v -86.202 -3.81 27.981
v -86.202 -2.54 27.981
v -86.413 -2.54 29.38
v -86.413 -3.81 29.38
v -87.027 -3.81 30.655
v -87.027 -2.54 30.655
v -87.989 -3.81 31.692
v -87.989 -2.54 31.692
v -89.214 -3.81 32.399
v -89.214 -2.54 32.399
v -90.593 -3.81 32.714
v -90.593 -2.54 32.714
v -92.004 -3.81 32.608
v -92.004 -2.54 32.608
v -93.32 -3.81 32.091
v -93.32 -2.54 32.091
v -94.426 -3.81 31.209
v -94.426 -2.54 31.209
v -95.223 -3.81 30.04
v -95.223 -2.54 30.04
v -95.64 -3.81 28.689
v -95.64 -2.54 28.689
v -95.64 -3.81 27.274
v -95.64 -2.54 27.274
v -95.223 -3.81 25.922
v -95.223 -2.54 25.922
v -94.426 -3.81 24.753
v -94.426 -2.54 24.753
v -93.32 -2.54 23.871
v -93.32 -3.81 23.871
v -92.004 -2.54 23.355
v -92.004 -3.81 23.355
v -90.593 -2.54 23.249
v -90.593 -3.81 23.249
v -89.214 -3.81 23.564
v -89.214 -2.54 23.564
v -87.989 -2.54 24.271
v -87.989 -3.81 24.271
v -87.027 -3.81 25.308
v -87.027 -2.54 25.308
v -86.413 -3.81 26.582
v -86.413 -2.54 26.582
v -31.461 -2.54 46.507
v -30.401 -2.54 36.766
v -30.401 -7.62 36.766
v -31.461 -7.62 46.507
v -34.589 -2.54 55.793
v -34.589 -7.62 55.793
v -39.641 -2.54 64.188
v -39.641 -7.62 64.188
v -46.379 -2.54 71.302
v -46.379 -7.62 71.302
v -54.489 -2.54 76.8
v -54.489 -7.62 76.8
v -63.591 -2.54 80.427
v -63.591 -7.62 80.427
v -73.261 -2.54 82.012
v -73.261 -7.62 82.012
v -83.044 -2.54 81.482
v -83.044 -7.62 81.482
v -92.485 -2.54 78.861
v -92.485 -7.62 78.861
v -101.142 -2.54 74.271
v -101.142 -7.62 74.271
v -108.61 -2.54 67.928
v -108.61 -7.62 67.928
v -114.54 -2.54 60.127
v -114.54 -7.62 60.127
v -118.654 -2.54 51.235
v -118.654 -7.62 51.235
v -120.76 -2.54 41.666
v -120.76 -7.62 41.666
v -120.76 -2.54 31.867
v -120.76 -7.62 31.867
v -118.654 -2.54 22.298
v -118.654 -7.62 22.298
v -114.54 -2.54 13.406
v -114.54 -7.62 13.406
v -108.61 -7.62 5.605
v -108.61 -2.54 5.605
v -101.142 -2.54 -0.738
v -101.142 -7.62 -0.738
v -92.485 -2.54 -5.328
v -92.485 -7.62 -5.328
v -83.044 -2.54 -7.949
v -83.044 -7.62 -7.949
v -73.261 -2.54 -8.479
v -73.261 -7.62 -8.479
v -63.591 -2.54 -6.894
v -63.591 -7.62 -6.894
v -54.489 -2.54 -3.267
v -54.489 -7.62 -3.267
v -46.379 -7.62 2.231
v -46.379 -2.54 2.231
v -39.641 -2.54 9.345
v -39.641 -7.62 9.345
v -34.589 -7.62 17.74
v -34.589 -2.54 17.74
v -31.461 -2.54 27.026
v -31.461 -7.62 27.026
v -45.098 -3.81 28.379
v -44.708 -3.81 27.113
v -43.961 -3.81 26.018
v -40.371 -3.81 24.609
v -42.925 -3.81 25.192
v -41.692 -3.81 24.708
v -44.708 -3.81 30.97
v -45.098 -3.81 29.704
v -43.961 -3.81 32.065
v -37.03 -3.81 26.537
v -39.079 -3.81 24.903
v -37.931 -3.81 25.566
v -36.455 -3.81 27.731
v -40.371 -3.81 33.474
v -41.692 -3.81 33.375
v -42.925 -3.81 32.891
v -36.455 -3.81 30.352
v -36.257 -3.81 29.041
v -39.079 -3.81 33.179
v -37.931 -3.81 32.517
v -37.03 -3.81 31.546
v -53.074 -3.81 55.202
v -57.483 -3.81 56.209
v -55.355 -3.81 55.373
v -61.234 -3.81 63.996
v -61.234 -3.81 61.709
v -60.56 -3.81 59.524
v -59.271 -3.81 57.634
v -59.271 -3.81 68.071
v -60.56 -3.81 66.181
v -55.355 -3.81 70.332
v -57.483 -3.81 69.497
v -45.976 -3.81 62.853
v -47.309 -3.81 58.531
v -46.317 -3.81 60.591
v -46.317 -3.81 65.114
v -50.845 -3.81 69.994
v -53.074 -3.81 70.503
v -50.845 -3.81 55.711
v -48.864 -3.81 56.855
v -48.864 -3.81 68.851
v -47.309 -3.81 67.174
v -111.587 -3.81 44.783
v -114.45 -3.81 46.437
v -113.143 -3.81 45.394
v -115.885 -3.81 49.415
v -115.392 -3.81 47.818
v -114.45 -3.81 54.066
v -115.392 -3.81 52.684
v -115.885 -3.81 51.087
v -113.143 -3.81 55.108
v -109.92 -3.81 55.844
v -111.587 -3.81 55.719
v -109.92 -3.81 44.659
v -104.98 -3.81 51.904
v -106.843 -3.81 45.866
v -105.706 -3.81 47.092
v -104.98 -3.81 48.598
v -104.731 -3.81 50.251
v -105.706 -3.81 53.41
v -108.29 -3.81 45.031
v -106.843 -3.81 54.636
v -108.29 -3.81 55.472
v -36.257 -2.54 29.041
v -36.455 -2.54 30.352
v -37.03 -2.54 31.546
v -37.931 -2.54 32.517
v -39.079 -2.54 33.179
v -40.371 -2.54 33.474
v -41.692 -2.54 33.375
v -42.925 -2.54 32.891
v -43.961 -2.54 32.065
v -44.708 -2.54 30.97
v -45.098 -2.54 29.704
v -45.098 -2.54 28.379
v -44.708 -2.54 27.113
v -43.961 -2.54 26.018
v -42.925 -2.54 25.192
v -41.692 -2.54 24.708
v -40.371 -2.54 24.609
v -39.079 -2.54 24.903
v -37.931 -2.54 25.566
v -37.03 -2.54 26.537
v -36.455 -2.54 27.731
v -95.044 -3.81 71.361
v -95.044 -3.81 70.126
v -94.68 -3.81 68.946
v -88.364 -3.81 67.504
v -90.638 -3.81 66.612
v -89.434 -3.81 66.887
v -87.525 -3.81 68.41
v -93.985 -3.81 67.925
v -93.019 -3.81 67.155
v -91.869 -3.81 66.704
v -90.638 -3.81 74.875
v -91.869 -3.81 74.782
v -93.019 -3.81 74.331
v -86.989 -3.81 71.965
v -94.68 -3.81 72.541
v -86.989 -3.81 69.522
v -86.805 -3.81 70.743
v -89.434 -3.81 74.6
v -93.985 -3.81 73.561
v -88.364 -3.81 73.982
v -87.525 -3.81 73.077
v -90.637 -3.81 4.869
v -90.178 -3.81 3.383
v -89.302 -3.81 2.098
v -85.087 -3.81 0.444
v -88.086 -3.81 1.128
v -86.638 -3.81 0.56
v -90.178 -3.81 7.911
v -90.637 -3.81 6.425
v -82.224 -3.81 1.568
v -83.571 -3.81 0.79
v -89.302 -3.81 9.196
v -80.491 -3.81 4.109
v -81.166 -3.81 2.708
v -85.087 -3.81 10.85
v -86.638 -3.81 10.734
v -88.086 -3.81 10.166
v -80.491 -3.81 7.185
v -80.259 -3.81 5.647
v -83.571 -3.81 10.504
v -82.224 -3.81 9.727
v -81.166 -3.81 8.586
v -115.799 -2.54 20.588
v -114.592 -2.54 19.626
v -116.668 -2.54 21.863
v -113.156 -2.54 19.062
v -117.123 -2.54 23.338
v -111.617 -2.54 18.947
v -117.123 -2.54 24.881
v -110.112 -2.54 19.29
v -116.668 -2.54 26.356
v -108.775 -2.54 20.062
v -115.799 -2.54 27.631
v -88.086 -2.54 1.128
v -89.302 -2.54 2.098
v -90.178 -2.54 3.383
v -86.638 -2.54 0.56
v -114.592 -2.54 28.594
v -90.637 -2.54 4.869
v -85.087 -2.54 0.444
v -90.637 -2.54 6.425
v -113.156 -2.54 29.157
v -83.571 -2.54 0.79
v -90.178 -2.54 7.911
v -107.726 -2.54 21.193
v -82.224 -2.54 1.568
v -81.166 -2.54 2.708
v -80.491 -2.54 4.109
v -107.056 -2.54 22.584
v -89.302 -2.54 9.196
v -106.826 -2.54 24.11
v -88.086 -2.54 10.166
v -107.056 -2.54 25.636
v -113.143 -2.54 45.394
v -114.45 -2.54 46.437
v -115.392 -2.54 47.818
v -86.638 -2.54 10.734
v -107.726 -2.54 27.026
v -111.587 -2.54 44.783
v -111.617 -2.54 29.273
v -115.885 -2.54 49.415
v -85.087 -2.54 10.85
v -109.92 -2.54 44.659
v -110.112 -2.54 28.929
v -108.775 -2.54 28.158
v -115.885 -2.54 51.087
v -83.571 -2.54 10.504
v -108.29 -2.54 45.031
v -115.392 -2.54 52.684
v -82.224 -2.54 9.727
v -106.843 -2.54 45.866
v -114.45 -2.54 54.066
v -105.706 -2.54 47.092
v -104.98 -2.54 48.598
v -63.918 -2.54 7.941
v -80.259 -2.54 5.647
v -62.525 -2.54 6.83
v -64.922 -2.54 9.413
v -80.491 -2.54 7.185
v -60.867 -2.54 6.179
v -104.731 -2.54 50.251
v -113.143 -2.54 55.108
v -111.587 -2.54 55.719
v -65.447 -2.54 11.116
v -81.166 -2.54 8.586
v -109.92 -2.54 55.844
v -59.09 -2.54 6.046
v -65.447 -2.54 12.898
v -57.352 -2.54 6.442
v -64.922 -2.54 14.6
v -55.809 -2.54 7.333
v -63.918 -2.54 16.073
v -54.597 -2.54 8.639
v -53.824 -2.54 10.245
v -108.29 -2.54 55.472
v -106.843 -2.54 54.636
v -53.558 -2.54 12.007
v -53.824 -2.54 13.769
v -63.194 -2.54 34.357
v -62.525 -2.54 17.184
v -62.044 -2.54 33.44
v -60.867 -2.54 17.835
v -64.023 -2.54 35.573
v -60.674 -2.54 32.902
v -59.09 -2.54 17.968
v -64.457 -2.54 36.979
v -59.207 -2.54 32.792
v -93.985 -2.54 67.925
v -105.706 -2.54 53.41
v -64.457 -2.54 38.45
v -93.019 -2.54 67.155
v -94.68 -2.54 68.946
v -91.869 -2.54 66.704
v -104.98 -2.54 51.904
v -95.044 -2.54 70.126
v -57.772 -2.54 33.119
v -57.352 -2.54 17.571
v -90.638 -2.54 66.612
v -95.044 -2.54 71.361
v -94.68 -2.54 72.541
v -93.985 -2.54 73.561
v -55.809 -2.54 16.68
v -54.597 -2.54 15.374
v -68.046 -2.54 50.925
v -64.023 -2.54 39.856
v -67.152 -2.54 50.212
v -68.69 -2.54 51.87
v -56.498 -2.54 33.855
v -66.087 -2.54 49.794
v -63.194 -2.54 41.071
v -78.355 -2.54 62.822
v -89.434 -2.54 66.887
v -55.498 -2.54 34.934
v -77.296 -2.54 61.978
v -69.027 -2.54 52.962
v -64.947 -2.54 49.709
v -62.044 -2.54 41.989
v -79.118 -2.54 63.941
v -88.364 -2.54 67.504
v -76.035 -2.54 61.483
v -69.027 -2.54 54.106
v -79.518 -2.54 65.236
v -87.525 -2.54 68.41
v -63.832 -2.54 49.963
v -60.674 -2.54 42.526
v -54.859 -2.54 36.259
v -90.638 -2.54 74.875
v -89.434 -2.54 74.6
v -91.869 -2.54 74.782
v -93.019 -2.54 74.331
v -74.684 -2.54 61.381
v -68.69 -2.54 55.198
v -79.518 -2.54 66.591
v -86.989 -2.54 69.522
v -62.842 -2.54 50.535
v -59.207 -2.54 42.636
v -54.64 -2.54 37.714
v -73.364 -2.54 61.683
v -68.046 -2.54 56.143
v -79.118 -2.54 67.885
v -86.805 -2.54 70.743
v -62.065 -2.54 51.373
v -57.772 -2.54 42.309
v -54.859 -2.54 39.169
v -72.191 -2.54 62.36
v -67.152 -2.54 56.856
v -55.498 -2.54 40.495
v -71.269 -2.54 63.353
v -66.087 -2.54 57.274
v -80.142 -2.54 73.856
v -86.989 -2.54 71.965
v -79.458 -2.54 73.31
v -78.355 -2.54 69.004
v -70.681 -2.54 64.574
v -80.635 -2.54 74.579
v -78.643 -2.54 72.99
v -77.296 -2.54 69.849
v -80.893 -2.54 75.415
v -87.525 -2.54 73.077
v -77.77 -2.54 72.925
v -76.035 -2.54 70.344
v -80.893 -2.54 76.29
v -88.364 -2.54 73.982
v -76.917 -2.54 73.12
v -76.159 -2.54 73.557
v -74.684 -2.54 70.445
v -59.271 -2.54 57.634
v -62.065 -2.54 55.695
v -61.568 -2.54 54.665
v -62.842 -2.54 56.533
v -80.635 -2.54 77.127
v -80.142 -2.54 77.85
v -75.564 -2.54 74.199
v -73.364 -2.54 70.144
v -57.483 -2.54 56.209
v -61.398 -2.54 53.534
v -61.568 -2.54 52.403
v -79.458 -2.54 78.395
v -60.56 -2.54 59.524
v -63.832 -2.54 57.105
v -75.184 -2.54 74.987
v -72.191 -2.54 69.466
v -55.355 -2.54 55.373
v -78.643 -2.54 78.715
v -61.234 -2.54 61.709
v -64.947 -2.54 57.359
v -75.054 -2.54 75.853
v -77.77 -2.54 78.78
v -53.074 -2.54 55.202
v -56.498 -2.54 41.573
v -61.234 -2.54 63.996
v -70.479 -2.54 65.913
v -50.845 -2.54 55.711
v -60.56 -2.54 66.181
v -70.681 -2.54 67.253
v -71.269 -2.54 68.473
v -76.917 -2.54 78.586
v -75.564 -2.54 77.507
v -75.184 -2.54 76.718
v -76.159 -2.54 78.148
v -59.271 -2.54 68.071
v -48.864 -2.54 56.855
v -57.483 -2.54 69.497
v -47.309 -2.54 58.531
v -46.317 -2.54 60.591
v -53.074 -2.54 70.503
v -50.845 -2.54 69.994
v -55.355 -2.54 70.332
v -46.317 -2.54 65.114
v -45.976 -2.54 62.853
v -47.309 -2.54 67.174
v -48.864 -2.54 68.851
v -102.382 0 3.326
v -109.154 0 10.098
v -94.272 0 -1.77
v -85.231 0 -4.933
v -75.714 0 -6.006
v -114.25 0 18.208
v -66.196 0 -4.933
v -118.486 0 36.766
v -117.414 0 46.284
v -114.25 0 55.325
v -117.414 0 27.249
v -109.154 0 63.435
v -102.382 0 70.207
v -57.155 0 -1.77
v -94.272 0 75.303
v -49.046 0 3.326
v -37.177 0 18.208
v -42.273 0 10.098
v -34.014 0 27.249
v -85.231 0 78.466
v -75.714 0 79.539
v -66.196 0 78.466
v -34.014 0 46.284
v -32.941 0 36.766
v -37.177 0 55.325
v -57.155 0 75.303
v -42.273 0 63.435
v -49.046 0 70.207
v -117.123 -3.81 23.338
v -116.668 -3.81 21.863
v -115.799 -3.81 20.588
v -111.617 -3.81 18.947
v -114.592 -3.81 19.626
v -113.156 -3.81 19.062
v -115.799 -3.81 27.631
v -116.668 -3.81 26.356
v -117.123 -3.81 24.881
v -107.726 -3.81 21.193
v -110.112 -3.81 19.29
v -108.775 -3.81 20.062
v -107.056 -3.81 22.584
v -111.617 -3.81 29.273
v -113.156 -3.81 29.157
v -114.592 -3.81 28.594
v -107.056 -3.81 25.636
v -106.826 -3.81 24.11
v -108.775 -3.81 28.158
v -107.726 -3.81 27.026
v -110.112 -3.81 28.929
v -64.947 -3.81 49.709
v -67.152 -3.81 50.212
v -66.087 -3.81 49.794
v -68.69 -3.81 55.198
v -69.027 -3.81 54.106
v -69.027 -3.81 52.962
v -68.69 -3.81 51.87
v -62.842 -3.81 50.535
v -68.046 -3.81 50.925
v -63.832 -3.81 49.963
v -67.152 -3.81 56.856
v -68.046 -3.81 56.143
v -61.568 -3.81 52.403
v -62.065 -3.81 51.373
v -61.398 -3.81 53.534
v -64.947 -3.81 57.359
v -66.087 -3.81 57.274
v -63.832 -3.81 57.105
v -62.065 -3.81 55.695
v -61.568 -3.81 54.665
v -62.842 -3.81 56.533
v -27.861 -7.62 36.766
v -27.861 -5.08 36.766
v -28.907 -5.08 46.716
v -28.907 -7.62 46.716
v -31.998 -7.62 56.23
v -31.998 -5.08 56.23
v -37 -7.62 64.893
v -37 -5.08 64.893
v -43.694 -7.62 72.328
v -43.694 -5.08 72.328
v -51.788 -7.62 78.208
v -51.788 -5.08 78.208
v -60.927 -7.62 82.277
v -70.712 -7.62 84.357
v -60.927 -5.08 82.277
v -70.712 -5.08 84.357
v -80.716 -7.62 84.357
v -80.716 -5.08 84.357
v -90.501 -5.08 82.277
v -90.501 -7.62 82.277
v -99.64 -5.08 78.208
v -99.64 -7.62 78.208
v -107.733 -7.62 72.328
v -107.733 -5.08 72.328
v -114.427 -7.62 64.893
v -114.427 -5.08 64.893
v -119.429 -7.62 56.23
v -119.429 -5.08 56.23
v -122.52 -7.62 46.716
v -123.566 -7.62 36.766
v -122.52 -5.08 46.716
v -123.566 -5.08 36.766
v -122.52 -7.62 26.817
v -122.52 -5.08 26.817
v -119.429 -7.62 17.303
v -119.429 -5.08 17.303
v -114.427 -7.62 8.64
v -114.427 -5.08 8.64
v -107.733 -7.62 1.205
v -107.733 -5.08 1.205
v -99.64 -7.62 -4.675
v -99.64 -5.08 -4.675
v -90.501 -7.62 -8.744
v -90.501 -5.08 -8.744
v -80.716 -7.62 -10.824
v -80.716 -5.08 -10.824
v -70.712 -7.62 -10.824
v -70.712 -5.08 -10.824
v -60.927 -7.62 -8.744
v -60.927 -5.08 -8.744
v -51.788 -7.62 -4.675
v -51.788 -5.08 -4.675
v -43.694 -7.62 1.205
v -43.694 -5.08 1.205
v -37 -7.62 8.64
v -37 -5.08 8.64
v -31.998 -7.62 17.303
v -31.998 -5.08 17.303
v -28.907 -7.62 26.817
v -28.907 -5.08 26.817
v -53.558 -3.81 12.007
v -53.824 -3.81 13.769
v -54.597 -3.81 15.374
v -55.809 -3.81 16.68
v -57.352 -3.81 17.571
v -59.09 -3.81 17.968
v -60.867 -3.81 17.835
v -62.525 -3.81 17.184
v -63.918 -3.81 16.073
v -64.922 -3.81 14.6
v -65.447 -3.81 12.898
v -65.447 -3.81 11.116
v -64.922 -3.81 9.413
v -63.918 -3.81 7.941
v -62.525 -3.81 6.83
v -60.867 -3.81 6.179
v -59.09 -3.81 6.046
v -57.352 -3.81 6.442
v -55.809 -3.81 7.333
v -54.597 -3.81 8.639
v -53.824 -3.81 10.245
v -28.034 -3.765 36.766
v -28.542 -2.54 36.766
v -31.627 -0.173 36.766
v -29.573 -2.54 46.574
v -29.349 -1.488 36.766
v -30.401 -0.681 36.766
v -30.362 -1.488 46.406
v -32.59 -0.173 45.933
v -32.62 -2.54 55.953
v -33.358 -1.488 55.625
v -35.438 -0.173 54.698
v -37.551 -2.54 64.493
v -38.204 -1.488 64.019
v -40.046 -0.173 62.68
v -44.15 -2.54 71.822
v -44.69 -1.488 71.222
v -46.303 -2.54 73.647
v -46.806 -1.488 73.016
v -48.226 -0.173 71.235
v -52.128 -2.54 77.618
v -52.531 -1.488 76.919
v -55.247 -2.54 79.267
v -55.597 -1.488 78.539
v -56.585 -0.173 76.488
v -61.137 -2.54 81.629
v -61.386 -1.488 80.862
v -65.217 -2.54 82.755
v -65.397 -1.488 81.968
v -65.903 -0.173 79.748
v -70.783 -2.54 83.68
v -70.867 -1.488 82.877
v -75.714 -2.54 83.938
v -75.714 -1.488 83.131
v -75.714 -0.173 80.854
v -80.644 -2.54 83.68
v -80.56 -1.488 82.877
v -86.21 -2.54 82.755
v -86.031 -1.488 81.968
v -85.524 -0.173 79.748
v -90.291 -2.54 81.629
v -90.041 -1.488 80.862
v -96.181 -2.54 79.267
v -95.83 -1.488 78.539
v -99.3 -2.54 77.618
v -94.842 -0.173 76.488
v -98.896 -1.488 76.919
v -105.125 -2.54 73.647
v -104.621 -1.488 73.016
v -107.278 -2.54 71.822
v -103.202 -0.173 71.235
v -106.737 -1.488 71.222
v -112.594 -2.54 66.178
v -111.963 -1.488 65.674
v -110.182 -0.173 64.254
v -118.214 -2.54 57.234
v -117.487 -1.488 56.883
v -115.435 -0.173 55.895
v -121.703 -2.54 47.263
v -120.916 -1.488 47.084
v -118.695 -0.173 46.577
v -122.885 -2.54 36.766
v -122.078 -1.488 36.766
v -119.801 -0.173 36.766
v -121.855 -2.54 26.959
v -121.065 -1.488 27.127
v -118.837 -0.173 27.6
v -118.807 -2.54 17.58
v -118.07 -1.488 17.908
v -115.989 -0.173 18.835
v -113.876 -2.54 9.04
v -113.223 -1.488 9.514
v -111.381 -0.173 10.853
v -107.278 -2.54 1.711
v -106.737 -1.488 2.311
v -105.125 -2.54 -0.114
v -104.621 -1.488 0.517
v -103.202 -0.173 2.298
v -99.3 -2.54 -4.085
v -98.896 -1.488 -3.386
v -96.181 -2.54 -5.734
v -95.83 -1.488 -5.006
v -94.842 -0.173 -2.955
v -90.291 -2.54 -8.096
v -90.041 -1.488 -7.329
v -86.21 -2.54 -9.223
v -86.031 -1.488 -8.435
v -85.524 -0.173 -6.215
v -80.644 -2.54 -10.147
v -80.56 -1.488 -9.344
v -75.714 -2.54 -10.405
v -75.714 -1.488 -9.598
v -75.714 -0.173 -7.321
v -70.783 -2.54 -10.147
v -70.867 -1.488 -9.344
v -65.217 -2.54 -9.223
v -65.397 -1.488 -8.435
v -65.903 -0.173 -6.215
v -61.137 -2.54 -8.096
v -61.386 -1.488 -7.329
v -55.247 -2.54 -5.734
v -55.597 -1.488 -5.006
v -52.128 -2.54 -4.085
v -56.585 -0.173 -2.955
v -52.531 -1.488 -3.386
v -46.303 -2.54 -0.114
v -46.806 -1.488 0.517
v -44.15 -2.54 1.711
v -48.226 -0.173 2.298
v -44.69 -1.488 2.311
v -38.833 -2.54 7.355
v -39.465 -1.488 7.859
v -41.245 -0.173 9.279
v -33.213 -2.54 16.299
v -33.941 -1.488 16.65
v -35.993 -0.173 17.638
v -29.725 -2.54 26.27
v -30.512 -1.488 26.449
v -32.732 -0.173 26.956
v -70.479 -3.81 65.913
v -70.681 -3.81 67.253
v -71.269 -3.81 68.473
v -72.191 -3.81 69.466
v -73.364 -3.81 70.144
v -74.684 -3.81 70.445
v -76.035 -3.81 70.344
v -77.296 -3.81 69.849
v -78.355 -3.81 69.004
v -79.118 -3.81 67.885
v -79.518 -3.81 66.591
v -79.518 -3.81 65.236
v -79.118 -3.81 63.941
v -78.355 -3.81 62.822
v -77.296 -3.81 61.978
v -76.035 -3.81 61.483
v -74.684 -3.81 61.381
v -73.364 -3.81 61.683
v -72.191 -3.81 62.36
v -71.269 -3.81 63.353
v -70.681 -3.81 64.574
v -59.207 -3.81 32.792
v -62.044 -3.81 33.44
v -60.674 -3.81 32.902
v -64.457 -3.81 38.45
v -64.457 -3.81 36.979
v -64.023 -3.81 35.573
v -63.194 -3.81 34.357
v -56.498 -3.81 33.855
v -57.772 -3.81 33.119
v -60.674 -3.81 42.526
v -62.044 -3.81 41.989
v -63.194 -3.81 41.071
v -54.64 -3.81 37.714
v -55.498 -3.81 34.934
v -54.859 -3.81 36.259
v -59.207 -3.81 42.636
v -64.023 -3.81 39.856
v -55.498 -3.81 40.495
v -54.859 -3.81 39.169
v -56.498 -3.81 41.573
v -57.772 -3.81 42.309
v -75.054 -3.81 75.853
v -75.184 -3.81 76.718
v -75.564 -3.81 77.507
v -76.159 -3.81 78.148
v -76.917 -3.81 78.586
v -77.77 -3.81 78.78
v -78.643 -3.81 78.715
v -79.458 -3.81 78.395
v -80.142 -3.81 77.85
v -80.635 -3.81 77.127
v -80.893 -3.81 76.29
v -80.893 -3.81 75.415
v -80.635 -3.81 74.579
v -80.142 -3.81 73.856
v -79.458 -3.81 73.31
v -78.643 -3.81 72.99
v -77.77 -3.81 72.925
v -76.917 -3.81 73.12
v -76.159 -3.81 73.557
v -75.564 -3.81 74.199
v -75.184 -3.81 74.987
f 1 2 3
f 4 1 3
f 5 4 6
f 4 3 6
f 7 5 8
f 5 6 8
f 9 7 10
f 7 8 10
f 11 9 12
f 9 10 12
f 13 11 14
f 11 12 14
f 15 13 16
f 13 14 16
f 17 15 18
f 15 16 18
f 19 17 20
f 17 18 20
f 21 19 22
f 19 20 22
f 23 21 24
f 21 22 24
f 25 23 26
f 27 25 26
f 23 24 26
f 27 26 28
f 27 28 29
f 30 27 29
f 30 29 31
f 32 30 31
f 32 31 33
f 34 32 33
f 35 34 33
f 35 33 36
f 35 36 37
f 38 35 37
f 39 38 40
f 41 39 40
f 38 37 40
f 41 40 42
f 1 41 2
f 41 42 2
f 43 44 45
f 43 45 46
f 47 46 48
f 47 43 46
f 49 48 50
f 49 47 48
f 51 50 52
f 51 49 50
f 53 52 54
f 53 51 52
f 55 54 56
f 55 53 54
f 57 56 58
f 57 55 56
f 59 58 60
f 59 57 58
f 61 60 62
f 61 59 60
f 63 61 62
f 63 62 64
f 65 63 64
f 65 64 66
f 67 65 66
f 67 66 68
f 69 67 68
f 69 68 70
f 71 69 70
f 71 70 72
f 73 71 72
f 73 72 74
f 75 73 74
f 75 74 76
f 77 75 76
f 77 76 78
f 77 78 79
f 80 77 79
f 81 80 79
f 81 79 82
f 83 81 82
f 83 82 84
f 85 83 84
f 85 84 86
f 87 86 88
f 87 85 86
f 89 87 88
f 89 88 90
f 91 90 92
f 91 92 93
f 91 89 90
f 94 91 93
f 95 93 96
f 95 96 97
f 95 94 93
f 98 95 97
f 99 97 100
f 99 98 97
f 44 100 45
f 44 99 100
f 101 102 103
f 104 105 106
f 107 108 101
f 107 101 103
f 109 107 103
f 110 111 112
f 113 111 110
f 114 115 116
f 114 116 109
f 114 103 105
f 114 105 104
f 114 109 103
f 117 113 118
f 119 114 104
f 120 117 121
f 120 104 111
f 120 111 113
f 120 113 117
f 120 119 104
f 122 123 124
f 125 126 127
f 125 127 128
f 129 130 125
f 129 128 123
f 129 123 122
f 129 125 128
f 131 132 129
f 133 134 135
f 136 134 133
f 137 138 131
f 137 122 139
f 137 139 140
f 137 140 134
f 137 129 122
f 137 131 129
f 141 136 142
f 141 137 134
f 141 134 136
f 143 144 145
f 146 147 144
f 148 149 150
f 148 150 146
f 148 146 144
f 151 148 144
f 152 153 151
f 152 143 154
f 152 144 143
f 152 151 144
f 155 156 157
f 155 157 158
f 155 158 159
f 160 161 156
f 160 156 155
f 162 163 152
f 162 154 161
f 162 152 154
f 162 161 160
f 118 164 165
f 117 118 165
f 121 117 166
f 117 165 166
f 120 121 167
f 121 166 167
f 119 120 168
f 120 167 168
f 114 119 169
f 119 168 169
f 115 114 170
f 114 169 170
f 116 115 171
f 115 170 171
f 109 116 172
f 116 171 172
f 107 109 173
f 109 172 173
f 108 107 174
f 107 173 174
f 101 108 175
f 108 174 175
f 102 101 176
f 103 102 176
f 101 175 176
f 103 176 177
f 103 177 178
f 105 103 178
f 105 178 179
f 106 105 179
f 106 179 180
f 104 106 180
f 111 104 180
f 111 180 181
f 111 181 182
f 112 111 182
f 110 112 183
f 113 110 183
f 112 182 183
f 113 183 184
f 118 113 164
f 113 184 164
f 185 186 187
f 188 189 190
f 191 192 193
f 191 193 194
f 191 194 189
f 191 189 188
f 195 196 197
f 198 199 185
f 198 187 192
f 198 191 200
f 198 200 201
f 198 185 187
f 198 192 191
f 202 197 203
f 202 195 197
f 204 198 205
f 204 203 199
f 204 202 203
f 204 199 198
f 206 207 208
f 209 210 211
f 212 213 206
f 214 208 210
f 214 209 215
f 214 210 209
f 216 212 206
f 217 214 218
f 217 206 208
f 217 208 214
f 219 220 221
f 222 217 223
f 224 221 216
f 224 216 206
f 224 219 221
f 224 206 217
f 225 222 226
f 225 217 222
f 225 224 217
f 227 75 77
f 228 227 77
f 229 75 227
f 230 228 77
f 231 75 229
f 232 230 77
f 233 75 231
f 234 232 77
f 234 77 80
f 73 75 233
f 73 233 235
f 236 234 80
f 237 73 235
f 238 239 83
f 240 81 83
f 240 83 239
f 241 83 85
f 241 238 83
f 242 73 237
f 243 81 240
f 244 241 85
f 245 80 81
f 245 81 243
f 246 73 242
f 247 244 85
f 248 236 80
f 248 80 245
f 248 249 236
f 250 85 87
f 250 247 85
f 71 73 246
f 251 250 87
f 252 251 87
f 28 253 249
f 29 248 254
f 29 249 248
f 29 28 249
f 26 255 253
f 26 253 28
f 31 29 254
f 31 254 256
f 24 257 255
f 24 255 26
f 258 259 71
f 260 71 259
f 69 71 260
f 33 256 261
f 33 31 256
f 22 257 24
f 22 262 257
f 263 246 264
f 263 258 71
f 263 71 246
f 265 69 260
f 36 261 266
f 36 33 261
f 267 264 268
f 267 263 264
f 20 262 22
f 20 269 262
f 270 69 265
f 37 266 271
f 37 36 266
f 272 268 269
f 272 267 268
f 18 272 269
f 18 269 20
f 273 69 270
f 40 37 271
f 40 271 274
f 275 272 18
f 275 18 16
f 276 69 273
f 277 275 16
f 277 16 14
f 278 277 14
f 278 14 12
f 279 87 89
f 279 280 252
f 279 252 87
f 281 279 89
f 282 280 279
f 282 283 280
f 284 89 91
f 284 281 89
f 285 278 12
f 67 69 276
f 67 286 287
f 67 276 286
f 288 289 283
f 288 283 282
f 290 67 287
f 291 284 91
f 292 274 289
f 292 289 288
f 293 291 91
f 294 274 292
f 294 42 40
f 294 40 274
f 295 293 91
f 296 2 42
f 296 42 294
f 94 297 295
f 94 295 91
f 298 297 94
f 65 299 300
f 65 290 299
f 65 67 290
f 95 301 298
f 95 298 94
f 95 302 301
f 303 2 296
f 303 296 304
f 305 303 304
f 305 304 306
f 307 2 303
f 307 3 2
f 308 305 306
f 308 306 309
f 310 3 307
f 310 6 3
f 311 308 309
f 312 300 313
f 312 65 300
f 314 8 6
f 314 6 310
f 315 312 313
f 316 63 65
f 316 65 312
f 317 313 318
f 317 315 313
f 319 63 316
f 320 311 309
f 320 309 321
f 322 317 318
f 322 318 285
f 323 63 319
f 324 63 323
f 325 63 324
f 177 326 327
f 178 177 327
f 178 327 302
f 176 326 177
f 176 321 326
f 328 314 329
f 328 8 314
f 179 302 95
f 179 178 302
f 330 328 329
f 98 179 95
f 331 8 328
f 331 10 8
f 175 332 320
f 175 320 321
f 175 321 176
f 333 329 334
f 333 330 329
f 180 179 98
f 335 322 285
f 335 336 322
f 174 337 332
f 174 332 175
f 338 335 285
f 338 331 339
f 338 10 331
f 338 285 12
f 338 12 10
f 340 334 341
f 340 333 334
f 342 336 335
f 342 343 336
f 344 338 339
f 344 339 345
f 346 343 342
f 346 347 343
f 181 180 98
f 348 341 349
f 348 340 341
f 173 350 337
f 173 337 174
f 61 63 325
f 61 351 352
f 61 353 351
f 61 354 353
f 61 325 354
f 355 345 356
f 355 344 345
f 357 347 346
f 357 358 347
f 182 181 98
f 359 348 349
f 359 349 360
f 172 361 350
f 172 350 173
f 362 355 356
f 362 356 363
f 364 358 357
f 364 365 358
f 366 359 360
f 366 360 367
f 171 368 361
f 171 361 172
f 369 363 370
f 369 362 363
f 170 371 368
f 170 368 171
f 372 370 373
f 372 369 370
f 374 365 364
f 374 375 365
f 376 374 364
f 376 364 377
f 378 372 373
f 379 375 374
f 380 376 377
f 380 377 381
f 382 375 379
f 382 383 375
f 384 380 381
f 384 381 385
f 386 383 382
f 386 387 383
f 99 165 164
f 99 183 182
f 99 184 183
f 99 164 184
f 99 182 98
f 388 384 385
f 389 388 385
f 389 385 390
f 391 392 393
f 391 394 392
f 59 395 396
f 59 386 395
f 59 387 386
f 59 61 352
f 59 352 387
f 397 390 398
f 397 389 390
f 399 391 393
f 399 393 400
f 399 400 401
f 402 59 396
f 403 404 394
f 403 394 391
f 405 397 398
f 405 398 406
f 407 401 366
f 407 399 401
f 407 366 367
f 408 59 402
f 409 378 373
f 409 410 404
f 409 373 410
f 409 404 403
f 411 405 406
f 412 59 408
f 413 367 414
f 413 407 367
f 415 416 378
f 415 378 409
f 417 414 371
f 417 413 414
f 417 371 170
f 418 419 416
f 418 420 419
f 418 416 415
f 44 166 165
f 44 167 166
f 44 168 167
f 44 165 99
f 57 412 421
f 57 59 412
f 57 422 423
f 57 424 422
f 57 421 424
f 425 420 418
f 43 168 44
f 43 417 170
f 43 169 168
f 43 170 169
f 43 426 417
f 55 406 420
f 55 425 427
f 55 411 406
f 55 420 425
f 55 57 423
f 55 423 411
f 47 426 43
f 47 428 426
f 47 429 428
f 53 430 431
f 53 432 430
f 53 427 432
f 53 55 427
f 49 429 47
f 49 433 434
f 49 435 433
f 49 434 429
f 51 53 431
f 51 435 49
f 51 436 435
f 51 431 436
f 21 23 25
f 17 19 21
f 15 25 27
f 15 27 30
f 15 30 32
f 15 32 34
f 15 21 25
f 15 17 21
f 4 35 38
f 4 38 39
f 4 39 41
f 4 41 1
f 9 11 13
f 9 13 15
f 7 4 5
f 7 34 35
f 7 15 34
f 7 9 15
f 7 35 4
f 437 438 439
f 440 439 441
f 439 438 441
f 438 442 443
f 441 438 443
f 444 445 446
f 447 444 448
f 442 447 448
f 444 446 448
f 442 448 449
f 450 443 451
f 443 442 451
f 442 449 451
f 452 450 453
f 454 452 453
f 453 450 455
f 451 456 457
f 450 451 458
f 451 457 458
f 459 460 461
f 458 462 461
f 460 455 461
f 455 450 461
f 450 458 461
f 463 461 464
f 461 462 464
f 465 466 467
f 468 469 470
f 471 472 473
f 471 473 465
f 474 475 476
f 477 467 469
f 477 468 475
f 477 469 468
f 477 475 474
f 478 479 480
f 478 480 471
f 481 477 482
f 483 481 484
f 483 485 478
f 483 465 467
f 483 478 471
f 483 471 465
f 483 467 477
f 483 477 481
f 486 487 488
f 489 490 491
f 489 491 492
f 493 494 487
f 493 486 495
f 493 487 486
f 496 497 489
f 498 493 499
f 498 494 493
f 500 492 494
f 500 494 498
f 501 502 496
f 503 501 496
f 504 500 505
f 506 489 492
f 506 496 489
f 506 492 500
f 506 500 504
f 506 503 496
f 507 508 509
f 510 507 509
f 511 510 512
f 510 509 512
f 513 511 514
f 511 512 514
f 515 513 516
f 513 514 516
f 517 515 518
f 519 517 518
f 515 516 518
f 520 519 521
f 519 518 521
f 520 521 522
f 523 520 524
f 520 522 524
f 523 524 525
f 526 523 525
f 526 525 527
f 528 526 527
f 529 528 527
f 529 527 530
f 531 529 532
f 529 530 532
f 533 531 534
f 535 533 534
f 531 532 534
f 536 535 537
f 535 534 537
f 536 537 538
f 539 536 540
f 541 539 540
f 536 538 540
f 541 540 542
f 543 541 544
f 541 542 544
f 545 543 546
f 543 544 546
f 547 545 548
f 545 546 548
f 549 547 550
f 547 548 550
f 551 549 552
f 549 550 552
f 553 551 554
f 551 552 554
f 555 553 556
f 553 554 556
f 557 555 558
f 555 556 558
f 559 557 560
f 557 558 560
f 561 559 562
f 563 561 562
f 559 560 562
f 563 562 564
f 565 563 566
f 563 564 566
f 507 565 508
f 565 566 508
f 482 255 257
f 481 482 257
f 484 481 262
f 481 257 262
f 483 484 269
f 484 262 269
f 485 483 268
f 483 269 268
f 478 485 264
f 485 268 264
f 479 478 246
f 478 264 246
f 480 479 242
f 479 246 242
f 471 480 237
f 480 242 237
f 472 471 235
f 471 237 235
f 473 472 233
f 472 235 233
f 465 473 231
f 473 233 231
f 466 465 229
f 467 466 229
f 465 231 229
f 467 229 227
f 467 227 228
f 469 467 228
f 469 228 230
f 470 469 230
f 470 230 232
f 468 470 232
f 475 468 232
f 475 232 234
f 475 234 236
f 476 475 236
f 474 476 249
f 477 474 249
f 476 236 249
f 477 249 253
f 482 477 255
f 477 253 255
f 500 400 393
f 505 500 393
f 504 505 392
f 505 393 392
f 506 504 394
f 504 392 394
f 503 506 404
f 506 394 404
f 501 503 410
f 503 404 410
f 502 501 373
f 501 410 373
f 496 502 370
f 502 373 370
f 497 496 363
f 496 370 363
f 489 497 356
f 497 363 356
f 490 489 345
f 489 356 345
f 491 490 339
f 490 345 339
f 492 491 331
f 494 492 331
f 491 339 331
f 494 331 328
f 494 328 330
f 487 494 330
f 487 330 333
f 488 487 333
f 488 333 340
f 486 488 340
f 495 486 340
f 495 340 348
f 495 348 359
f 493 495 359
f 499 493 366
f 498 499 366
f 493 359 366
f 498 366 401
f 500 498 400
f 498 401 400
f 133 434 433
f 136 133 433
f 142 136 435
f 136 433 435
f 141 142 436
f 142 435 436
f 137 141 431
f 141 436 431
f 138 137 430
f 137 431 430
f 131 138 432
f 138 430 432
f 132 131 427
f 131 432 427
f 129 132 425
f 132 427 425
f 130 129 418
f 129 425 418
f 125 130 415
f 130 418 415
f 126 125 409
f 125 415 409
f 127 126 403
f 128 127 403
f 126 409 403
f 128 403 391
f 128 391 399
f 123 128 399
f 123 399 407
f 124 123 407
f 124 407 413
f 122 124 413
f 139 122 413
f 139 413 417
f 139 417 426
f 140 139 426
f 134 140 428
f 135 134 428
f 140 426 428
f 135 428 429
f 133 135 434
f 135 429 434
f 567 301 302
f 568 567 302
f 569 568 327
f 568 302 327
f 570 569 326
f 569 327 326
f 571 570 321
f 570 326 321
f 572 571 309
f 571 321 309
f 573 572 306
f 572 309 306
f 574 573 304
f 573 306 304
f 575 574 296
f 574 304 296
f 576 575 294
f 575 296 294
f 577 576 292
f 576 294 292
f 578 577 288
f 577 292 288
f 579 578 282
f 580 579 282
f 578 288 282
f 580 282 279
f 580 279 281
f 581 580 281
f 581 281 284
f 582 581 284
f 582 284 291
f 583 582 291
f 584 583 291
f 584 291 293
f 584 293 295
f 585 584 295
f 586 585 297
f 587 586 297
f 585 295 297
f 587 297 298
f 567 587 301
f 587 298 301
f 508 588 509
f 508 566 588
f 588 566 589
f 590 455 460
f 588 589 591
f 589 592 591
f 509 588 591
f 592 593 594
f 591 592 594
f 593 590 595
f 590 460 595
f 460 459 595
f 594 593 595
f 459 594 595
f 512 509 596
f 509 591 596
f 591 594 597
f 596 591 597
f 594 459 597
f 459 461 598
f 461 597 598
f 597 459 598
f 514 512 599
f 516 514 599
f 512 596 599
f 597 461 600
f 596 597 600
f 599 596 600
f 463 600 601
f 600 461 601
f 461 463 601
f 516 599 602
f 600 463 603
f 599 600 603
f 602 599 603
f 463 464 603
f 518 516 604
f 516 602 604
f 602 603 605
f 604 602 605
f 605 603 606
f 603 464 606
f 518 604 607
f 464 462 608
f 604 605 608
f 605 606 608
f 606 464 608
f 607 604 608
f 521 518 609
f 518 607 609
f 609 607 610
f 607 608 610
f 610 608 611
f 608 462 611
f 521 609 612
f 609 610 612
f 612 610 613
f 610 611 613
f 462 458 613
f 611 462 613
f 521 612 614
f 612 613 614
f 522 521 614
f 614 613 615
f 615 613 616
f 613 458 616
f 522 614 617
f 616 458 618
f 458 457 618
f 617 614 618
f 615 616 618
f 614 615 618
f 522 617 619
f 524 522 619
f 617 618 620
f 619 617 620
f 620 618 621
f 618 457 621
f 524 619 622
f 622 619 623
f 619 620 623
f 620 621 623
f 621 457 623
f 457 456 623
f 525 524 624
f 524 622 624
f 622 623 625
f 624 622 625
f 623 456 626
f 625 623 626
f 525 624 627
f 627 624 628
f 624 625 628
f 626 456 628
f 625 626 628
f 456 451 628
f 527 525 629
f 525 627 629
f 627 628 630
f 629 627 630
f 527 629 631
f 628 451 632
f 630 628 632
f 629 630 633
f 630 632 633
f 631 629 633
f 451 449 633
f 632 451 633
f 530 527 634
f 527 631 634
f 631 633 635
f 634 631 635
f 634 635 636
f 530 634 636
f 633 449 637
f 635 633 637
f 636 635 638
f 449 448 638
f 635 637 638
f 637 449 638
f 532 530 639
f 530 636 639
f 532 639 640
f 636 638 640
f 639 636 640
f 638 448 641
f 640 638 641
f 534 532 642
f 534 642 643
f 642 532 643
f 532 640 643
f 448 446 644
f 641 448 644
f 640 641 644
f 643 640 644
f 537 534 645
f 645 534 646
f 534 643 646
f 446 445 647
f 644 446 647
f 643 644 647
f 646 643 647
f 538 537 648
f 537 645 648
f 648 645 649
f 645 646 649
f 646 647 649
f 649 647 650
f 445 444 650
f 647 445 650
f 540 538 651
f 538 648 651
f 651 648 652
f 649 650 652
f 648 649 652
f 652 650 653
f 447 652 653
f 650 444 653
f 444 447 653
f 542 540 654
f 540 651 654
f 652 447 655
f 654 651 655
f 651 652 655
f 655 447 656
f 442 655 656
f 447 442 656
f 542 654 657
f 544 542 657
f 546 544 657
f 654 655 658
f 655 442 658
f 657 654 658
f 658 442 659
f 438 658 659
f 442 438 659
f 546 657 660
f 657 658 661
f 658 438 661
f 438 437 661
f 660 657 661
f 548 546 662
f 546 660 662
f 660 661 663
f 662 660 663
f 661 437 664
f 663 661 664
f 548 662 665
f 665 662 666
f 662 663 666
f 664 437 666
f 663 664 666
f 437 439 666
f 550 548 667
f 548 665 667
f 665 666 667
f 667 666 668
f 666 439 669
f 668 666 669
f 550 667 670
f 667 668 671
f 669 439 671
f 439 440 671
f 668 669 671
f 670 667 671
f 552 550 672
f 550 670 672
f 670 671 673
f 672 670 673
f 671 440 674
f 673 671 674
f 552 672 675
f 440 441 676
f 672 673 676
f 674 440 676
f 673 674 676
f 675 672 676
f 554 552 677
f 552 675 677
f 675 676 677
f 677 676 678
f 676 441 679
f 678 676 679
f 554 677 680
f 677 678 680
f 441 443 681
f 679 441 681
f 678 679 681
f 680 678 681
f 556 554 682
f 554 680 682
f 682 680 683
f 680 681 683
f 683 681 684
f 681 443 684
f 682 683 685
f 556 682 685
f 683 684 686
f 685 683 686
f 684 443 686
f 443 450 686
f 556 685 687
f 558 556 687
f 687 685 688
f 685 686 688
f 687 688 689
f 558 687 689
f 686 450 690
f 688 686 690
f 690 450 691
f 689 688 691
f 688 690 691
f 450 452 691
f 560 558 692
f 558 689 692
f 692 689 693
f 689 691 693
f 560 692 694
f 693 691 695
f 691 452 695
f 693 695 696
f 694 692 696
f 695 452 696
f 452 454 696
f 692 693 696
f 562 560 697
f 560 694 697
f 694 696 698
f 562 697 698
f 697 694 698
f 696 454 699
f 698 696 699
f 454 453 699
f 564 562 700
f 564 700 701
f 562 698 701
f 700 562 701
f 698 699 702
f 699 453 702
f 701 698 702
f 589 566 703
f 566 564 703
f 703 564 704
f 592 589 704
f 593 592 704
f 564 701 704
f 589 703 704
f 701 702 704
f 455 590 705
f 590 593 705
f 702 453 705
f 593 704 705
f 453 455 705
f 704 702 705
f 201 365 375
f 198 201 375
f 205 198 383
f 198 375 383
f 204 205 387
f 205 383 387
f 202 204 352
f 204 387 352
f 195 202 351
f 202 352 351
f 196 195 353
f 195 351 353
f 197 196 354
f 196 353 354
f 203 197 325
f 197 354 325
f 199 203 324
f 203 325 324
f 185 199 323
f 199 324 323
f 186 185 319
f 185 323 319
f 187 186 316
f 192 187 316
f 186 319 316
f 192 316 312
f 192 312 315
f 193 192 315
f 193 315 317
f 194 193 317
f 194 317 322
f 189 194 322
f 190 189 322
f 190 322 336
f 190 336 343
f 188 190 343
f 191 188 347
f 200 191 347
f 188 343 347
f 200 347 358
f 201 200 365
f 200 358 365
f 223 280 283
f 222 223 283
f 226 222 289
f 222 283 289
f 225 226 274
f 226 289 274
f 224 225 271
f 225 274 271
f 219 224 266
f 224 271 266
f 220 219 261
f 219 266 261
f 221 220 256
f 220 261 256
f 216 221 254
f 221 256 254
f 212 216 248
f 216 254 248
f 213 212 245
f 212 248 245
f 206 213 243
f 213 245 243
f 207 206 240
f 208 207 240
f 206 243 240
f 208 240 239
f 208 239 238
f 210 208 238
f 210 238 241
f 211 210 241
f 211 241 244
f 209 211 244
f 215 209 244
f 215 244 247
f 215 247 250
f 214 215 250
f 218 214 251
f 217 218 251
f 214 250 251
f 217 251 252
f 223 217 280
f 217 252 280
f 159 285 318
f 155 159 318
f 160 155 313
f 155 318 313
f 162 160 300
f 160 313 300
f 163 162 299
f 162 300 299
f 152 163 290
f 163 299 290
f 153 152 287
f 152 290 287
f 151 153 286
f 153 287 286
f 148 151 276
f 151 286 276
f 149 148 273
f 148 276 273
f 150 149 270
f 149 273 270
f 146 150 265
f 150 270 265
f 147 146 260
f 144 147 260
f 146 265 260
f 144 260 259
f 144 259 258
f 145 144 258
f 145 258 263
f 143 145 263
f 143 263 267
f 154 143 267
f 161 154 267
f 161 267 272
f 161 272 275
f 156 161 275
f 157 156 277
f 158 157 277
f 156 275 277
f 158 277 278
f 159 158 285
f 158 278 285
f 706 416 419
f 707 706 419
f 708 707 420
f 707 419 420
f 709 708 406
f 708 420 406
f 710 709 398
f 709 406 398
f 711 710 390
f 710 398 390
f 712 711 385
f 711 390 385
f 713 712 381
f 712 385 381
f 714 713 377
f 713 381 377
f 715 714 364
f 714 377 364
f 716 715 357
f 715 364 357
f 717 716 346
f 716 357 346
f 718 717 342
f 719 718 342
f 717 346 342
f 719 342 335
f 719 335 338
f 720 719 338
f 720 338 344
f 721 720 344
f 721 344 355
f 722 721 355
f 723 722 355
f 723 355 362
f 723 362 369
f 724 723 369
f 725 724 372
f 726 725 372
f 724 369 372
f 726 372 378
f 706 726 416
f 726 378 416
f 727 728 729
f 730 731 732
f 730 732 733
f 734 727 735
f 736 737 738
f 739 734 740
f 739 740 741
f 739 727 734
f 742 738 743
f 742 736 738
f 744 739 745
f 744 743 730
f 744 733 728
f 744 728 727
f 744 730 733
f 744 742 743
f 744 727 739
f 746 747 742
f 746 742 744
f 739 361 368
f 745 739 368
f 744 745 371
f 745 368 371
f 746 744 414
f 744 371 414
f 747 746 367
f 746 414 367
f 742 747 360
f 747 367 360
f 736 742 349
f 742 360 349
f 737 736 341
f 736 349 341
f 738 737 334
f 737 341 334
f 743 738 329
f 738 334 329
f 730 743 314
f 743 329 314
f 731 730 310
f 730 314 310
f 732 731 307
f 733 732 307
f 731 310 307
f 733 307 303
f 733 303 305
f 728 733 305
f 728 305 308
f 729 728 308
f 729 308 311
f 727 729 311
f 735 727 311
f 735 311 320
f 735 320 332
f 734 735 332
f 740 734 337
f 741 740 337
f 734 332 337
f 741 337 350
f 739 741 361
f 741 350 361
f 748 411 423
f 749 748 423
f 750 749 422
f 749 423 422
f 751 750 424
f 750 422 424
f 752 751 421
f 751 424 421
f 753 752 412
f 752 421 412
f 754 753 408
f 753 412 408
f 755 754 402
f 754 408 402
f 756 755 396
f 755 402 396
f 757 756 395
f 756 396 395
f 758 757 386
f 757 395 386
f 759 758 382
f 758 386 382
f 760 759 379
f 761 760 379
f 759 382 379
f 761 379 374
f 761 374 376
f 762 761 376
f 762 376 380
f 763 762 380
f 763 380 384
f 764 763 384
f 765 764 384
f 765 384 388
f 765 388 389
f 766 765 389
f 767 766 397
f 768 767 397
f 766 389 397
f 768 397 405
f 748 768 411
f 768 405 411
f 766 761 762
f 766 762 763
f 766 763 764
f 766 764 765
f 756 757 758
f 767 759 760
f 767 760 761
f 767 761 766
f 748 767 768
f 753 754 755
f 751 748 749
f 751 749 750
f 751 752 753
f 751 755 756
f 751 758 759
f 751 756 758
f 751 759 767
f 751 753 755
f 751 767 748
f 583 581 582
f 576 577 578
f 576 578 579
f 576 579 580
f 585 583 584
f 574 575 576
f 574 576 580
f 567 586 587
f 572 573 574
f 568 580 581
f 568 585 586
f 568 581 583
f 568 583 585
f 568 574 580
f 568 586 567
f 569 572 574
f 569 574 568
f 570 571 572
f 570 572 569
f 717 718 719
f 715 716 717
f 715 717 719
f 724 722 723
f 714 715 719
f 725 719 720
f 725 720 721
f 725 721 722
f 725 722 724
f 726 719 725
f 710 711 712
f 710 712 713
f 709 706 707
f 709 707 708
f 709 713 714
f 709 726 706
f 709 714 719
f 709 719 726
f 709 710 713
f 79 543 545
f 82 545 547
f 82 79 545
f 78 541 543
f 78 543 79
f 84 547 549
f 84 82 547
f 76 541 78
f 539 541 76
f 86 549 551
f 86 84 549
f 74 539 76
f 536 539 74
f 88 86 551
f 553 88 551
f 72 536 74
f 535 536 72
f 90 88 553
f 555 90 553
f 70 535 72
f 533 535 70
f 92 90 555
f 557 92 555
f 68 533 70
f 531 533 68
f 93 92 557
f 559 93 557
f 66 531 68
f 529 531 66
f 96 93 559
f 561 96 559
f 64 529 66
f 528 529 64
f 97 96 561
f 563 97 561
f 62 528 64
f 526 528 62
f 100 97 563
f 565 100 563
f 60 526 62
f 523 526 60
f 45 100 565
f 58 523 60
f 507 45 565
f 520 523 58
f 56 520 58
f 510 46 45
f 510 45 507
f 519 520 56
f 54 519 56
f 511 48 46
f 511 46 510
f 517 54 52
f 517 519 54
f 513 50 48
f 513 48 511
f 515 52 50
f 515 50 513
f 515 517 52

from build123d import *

# Parameters (mm, degrees)
F0_R     = 47.852278
F1_DEPTH = 7.62
F2_T     = -2.54
F4_R     = 5.608286
F4_R_2   = 5.177589
F4_R_3   = 5.217798
F4_R_4   = 5.97792
F4_R_5   = 4.935933
F4_R_6   = 4.445249
F4_R_7   = 4.745595
F4_R_8   = 4.142937
F4_R_9   = 2.93605
F4_R_10  = 4.544521
F4_R_11  = 7.671855
F4_R_12  = 3.835925
F5_DEPTH = 1.27
F6_R     = 5.08


with BuildPart() as f1:
    # F0 (on Front) → F1 (new body)
    with BuildSketch(Plane.XZ):
        with Locations((-75.713672, 36.766488)):
            Circle(F0_R)
    extrude(amount=F1_DEPTH)

    # F2
    f2_openings = [f1.faces().sort_by_distance(p)[0] for p in [
        (-75.713672, -7.62, 36.766488),
    ]]
    offset(amount=F2_T, openings=f2_openings)

    # F4 (on face) → F5 (join)
    with BuildSketch(Plane.XZ.offset(2.54)):
        with Locations((-110.339284, 50.251123)):
            Circle(F4_R)
        with Locations((-112.003483, 24.109663)):
            Circle(F4_R_2)
        with Locations((-85.477225, 5.647067)):
            Circle(F4_R_3)
        with Locations((-59.536304, 12.006708)):
            Circle(F4_R_4)
        with Locations((-59.57577, 37.714168)):
            Circle(F4_R_5)
        with Locations((-40.702716, 29.041462)):
            Circle(F4_R_6)
        with Locations((-90.947576, 27.981274)):
            Circle(F4_R_7)
        with Locations((-90.947576, 70.743375)):
            Circle(F4_R_8)
        with Locations((-77.989683, 75.85264)):
            Circle(F4_R_9)
        with Locations((-75.023986, 65.913238)):
            Circle(F4_R_10)
        with Locations((-53.647552, 62.852636)):
            Circle(F4_R_11)
        with Locations((-65.233916, 53.533848)):
            Circle(F4_R_12)
    extrude(amount=F5_DEPTH)

    # F6
    f6_edges = [f1.edges().sort_by_distance(p)[0] for p in [
        (-123.565949, 0, 36.766488),
    ]]
    fillet(f6_edges, radius=F6_R)


solid = f1.part
